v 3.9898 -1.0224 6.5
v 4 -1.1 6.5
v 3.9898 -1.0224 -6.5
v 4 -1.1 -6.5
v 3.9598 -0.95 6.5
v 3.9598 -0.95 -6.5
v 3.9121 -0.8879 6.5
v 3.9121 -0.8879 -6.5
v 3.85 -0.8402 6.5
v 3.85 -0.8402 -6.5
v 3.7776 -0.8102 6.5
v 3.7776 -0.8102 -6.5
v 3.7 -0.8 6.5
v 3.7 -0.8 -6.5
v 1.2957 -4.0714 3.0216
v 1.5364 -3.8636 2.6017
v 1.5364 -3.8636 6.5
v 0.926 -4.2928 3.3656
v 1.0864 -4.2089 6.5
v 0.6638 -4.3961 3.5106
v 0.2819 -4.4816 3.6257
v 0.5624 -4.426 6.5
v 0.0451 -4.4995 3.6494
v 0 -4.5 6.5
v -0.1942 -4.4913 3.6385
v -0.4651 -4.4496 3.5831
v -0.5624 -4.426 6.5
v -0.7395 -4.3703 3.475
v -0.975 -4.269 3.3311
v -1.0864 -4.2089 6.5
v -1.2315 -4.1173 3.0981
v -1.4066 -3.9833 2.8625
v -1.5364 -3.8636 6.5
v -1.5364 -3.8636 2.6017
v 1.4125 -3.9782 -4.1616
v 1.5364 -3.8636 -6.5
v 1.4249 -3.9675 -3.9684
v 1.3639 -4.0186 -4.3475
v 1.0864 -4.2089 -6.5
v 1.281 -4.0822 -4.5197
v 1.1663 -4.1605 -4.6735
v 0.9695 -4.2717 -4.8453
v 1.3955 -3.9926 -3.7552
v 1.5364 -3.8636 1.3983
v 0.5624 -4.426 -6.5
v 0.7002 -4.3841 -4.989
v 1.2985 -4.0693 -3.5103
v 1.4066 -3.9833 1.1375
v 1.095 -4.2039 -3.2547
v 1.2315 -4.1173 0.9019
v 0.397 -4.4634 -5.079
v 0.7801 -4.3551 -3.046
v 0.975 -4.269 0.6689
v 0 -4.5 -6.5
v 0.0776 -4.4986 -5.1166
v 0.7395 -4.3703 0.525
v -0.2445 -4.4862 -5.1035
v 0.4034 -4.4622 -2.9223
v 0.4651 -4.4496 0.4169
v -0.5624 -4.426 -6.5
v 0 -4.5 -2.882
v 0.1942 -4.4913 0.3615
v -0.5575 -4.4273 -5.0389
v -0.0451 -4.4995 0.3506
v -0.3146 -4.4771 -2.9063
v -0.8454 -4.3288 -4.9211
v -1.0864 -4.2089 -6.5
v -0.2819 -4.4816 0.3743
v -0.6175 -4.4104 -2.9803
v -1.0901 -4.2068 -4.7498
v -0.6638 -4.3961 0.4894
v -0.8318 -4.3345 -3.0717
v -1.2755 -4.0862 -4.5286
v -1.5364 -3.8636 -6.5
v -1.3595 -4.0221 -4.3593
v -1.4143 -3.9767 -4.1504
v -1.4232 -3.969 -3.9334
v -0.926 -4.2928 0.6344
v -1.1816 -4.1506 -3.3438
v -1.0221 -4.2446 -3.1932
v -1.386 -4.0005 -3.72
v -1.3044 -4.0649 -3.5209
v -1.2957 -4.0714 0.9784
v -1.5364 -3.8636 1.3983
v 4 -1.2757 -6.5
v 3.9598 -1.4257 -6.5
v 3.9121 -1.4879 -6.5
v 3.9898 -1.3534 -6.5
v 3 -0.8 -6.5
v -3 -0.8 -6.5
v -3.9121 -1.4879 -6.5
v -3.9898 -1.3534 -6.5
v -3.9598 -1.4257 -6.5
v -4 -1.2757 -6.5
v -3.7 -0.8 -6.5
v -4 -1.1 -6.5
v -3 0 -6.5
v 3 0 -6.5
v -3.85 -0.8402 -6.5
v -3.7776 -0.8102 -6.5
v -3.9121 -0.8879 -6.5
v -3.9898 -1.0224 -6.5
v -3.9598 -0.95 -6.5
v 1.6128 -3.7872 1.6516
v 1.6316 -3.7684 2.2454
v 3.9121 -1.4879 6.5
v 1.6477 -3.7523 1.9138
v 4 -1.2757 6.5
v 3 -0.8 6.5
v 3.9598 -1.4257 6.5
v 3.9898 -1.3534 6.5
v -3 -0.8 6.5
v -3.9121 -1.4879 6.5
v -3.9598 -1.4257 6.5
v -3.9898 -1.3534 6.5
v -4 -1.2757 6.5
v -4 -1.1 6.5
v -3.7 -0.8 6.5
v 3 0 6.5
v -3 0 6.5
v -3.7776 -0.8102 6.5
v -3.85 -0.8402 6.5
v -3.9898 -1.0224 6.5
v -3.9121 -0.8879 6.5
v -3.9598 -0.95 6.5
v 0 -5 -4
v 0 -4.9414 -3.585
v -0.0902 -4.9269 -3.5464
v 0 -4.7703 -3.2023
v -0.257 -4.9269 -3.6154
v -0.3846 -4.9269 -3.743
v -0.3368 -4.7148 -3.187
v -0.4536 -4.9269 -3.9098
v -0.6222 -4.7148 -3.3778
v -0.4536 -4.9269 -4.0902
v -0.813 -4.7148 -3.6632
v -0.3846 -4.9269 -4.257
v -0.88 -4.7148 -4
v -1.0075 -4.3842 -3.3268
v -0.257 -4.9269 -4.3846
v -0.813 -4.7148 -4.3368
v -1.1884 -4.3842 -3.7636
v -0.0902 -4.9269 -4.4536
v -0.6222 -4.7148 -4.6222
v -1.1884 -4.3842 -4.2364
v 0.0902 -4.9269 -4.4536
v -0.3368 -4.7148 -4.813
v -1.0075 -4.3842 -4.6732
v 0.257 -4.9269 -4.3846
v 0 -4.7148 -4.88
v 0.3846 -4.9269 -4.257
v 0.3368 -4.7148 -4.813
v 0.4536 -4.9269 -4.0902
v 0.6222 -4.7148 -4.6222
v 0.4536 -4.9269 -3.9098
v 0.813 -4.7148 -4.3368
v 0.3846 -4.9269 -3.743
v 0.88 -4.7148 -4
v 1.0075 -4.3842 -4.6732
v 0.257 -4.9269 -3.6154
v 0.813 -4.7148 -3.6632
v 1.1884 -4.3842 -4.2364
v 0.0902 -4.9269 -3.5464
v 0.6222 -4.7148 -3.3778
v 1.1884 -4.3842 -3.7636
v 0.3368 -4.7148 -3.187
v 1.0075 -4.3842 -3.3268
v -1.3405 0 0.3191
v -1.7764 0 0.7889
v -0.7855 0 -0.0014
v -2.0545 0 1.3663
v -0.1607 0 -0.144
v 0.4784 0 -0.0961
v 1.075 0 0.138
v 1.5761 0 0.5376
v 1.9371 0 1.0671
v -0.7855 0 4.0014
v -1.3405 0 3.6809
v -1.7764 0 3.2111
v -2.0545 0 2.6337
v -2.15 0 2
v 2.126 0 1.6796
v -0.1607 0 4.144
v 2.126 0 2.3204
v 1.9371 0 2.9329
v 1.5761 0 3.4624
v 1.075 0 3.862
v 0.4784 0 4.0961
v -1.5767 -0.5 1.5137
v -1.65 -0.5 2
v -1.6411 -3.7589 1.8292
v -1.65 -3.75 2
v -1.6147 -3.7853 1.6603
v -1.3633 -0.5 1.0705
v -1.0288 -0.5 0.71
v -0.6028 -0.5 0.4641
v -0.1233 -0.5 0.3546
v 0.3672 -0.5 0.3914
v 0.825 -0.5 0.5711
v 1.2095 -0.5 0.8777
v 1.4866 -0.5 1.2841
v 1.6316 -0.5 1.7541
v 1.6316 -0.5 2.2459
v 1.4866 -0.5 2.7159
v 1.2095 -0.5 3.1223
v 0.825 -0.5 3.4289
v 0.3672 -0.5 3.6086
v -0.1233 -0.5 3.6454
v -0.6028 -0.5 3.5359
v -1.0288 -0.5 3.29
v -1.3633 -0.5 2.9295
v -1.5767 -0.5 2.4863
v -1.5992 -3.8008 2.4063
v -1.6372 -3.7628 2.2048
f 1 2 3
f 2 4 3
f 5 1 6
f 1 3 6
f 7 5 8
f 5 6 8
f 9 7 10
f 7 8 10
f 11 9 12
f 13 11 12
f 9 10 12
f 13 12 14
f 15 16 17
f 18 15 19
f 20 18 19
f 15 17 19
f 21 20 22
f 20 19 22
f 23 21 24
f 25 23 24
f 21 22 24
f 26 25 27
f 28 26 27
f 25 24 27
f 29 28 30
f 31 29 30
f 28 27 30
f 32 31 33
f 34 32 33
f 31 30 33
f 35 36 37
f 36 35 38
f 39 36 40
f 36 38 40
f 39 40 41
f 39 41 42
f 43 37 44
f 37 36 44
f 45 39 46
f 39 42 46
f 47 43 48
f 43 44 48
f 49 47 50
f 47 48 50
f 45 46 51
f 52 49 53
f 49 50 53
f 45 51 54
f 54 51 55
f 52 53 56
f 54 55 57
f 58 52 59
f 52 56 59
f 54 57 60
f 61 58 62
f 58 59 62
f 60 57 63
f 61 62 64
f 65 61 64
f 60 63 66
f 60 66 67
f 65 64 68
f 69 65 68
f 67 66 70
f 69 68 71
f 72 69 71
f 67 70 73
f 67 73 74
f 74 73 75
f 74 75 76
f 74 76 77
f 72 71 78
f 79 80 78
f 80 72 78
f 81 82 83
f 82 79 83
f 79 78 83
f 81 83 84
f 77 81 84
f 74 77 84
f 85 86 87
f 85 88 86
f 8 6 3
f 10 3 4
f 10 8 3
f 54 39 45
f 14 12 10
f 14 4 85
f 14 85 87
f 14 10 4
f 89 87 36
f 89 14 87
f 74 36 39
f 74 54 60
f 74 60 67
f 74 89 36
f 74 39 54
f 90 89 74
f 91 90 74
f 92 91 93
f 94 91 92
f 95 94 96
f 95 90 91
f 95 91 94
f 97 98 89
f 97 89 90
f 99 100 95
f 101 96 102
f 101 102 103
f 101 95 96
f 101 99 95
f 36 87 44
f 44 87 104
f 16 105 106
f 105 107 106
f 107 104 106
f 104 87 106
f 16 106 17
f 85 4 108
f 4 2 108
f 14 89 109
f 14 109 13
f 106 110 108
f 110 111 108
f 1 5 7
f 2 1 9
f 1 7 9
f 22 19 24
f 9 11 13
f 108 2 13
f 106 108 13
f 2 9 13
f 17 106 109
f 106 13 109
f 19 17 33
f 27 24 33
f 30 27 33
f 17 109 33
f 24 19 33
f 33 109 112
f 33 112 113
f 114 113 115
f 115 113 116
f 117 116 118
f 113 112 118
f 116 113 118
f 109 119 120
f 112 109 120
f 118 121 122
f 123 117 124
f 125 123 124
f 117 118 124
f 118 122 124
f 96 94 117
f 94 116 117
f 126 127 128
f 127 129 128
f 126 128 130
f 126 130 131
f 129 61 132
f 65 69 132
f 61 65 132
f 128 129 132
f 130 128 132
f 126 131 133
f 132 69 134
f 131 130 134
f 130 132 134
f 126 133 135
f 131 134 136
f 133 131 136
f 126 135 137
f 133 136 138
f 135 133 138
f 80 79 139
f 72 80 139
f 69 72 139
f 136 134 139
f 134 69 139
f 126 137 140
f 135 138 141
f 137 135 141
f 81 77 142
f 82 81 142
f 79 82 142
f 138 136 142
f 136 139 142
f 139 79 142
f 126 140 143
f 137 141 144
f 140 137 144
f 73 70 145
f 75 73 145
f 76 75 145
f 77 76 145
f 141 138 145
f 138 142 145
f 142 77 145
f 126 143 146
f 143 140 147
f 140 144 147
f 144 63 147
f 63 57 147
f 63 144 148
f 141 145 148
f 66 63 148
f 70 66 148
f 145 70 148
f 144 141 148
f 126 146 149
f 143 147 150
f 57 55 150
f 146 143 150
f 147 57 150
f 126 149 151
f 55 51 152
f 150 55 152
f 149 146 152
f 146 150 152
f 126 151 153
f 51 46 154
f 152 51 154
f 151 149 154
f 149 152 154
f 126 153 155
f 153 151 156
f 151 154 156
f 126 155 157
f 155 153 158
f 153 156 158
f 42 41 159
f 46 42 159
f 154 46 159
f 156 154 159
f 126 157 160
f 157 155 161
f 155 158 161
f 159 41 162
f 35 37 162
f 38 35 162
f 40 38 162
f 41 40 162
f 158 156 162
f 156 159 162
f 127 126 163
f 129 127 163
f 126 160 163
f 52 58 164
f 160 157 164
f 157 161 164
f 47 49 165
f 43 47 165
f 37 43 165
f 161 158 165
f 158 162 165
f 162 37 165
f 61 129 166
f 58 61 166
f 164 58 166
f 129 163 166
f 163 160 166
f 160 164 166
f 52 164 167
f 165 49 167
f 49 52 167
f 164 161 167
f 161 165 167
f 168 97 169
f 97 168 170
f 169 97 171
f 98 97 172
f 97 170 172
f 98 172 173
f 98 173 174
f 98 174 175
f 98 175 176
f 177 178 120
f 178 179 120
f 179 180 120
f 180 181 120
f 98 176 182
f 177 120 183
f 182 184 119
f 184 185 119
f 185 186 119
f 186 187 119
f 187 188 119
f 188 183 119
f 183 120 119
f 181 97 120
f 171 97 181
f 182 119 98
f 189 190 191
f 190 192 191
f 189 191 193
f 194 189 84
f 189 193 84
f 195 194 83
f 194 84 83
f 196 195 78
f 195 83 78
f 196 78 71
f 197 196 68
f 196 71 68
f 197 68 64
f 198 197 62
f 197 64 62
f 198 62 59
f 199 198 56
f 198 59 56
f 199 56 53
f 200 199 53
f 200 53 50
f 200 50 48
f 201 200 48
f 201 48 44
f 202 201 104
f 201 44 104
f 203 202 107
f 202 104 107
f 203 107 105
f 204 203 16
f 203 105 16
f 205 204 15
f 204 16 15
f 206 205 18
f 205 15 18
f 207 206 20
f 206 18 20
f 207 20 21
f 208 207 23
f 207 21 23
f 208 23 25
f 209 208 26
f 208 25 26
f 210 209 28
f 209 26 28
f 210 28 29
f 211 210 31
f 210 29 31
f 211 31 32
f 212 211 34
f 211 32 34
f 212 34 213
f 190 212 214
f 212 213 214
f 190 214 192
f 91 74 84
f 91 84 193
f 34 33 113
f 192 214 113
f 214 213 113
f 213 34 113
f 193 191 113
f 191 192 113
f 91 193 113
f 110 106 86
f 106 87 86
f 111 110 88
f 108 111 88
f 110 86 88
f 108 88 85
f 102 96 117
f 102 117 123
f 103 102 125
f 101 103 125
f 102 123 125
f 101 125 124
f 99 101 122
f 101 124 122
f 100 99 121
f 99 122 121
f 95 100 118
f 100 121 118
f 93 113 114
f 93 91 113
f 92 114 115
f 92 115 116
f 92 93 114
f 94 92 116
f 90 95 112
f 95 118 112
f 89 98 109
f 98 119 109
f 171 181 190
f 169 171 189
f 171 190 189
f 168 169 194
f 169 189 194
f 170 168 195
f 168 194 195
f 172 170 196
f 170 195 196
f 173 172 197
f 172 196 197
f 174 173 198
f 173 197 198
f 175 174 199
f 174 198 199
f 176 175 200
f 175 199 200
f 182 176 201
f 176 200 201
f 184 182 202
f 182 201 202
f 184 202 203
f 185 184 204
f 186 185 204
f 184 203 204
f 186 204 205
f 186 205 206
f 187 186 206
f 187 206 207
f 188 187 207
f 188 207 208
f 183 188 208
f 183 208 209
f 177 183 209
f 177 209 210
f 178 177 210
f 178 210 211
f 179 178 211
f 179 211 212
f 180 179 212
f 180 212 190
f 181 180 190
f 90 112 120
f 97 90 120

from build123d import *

# Parameters (mm, degrees)
EXTRUDE_1_DEPTH             = 6.5
HOLE_WIZARD_M41_D           = 3.3
HOLE_WIZARD_M41_CSINK_D     = 4.3
HOLE_WIZARD_M41_CSINK_ANGLE = 90
FILLET_1_R                  = 0.3


with BuildPart() as part:
    # Эскиз1 → Бобышка-Вытянуть1 (new body, symmetric)
    with BuildSketch(Plane.XY):
        with BuildLine():
            Line((-3, 0), (3, 0))
            Line((3, 0), (3, -0.8))
            Line((3, -0.8), (4, -0.8))
            Line((4, -0.8), (4, -1.4))
            Line((4, -1.4), (1.536396103, -3.863603897))
            ThreePointArc((1.536396103, -3.863603897), (0, -4.5), (-1.536396103, -3.863603897))
            Line((-1.536396103, -3.863603897), (-4, -1.4))
            Line((-4, -1.4), (-4, -0.8))
            Line((-4, -0.8), (-3, -0.8))
            Line((-3, -0.8), (-3, 0))
        make_face()
    extrude(amount=EXTRUDE_1_DEPTH, both=True)

    # Отверстие обработанное метчиком M41 (through all)
    with Locations(Plane(origin=(0, 0, 0), x_dir=(1, 0, 0), z_dir=(0, 1, 0))):
        with Locations((0, -2)):
            CounterSinkHole(HOLE_WIZARD_M41_D / 2, HOLE_WIZARD_M41_CSINK_D / 2, counter_sink_angle=HOLE_WIZARD_M41_CSINK_ANGLE)

    # Эскиз5 → Повернуть1 (revolve)
    with BuildSketch(Plane(origin=(0, 0, 0), x_dir=(0, 0, -1), z_dir=(1, 0, 0))):
        with BuildLine():
            Line((4, -2), (4, -5))
            ThreePointArc((4, -5), (2.5, -3.5), (4, -2))
        make_face()
    revolve(axis=Axis((0, -2, -4), (0, -1, 0)))

    # Скругление1
    fillet_1_edges = [part.edges().sort_by_distance(p)[0] for p in [
        (4, -0.8, 0),
        (4, -1.4, 0),
        (-4, -1.4, 0),
        (-4, -0.8, 0),
    ]]
    fillet(fillet_1_edges, radius=FILLET_1_R)


solid = part.part
